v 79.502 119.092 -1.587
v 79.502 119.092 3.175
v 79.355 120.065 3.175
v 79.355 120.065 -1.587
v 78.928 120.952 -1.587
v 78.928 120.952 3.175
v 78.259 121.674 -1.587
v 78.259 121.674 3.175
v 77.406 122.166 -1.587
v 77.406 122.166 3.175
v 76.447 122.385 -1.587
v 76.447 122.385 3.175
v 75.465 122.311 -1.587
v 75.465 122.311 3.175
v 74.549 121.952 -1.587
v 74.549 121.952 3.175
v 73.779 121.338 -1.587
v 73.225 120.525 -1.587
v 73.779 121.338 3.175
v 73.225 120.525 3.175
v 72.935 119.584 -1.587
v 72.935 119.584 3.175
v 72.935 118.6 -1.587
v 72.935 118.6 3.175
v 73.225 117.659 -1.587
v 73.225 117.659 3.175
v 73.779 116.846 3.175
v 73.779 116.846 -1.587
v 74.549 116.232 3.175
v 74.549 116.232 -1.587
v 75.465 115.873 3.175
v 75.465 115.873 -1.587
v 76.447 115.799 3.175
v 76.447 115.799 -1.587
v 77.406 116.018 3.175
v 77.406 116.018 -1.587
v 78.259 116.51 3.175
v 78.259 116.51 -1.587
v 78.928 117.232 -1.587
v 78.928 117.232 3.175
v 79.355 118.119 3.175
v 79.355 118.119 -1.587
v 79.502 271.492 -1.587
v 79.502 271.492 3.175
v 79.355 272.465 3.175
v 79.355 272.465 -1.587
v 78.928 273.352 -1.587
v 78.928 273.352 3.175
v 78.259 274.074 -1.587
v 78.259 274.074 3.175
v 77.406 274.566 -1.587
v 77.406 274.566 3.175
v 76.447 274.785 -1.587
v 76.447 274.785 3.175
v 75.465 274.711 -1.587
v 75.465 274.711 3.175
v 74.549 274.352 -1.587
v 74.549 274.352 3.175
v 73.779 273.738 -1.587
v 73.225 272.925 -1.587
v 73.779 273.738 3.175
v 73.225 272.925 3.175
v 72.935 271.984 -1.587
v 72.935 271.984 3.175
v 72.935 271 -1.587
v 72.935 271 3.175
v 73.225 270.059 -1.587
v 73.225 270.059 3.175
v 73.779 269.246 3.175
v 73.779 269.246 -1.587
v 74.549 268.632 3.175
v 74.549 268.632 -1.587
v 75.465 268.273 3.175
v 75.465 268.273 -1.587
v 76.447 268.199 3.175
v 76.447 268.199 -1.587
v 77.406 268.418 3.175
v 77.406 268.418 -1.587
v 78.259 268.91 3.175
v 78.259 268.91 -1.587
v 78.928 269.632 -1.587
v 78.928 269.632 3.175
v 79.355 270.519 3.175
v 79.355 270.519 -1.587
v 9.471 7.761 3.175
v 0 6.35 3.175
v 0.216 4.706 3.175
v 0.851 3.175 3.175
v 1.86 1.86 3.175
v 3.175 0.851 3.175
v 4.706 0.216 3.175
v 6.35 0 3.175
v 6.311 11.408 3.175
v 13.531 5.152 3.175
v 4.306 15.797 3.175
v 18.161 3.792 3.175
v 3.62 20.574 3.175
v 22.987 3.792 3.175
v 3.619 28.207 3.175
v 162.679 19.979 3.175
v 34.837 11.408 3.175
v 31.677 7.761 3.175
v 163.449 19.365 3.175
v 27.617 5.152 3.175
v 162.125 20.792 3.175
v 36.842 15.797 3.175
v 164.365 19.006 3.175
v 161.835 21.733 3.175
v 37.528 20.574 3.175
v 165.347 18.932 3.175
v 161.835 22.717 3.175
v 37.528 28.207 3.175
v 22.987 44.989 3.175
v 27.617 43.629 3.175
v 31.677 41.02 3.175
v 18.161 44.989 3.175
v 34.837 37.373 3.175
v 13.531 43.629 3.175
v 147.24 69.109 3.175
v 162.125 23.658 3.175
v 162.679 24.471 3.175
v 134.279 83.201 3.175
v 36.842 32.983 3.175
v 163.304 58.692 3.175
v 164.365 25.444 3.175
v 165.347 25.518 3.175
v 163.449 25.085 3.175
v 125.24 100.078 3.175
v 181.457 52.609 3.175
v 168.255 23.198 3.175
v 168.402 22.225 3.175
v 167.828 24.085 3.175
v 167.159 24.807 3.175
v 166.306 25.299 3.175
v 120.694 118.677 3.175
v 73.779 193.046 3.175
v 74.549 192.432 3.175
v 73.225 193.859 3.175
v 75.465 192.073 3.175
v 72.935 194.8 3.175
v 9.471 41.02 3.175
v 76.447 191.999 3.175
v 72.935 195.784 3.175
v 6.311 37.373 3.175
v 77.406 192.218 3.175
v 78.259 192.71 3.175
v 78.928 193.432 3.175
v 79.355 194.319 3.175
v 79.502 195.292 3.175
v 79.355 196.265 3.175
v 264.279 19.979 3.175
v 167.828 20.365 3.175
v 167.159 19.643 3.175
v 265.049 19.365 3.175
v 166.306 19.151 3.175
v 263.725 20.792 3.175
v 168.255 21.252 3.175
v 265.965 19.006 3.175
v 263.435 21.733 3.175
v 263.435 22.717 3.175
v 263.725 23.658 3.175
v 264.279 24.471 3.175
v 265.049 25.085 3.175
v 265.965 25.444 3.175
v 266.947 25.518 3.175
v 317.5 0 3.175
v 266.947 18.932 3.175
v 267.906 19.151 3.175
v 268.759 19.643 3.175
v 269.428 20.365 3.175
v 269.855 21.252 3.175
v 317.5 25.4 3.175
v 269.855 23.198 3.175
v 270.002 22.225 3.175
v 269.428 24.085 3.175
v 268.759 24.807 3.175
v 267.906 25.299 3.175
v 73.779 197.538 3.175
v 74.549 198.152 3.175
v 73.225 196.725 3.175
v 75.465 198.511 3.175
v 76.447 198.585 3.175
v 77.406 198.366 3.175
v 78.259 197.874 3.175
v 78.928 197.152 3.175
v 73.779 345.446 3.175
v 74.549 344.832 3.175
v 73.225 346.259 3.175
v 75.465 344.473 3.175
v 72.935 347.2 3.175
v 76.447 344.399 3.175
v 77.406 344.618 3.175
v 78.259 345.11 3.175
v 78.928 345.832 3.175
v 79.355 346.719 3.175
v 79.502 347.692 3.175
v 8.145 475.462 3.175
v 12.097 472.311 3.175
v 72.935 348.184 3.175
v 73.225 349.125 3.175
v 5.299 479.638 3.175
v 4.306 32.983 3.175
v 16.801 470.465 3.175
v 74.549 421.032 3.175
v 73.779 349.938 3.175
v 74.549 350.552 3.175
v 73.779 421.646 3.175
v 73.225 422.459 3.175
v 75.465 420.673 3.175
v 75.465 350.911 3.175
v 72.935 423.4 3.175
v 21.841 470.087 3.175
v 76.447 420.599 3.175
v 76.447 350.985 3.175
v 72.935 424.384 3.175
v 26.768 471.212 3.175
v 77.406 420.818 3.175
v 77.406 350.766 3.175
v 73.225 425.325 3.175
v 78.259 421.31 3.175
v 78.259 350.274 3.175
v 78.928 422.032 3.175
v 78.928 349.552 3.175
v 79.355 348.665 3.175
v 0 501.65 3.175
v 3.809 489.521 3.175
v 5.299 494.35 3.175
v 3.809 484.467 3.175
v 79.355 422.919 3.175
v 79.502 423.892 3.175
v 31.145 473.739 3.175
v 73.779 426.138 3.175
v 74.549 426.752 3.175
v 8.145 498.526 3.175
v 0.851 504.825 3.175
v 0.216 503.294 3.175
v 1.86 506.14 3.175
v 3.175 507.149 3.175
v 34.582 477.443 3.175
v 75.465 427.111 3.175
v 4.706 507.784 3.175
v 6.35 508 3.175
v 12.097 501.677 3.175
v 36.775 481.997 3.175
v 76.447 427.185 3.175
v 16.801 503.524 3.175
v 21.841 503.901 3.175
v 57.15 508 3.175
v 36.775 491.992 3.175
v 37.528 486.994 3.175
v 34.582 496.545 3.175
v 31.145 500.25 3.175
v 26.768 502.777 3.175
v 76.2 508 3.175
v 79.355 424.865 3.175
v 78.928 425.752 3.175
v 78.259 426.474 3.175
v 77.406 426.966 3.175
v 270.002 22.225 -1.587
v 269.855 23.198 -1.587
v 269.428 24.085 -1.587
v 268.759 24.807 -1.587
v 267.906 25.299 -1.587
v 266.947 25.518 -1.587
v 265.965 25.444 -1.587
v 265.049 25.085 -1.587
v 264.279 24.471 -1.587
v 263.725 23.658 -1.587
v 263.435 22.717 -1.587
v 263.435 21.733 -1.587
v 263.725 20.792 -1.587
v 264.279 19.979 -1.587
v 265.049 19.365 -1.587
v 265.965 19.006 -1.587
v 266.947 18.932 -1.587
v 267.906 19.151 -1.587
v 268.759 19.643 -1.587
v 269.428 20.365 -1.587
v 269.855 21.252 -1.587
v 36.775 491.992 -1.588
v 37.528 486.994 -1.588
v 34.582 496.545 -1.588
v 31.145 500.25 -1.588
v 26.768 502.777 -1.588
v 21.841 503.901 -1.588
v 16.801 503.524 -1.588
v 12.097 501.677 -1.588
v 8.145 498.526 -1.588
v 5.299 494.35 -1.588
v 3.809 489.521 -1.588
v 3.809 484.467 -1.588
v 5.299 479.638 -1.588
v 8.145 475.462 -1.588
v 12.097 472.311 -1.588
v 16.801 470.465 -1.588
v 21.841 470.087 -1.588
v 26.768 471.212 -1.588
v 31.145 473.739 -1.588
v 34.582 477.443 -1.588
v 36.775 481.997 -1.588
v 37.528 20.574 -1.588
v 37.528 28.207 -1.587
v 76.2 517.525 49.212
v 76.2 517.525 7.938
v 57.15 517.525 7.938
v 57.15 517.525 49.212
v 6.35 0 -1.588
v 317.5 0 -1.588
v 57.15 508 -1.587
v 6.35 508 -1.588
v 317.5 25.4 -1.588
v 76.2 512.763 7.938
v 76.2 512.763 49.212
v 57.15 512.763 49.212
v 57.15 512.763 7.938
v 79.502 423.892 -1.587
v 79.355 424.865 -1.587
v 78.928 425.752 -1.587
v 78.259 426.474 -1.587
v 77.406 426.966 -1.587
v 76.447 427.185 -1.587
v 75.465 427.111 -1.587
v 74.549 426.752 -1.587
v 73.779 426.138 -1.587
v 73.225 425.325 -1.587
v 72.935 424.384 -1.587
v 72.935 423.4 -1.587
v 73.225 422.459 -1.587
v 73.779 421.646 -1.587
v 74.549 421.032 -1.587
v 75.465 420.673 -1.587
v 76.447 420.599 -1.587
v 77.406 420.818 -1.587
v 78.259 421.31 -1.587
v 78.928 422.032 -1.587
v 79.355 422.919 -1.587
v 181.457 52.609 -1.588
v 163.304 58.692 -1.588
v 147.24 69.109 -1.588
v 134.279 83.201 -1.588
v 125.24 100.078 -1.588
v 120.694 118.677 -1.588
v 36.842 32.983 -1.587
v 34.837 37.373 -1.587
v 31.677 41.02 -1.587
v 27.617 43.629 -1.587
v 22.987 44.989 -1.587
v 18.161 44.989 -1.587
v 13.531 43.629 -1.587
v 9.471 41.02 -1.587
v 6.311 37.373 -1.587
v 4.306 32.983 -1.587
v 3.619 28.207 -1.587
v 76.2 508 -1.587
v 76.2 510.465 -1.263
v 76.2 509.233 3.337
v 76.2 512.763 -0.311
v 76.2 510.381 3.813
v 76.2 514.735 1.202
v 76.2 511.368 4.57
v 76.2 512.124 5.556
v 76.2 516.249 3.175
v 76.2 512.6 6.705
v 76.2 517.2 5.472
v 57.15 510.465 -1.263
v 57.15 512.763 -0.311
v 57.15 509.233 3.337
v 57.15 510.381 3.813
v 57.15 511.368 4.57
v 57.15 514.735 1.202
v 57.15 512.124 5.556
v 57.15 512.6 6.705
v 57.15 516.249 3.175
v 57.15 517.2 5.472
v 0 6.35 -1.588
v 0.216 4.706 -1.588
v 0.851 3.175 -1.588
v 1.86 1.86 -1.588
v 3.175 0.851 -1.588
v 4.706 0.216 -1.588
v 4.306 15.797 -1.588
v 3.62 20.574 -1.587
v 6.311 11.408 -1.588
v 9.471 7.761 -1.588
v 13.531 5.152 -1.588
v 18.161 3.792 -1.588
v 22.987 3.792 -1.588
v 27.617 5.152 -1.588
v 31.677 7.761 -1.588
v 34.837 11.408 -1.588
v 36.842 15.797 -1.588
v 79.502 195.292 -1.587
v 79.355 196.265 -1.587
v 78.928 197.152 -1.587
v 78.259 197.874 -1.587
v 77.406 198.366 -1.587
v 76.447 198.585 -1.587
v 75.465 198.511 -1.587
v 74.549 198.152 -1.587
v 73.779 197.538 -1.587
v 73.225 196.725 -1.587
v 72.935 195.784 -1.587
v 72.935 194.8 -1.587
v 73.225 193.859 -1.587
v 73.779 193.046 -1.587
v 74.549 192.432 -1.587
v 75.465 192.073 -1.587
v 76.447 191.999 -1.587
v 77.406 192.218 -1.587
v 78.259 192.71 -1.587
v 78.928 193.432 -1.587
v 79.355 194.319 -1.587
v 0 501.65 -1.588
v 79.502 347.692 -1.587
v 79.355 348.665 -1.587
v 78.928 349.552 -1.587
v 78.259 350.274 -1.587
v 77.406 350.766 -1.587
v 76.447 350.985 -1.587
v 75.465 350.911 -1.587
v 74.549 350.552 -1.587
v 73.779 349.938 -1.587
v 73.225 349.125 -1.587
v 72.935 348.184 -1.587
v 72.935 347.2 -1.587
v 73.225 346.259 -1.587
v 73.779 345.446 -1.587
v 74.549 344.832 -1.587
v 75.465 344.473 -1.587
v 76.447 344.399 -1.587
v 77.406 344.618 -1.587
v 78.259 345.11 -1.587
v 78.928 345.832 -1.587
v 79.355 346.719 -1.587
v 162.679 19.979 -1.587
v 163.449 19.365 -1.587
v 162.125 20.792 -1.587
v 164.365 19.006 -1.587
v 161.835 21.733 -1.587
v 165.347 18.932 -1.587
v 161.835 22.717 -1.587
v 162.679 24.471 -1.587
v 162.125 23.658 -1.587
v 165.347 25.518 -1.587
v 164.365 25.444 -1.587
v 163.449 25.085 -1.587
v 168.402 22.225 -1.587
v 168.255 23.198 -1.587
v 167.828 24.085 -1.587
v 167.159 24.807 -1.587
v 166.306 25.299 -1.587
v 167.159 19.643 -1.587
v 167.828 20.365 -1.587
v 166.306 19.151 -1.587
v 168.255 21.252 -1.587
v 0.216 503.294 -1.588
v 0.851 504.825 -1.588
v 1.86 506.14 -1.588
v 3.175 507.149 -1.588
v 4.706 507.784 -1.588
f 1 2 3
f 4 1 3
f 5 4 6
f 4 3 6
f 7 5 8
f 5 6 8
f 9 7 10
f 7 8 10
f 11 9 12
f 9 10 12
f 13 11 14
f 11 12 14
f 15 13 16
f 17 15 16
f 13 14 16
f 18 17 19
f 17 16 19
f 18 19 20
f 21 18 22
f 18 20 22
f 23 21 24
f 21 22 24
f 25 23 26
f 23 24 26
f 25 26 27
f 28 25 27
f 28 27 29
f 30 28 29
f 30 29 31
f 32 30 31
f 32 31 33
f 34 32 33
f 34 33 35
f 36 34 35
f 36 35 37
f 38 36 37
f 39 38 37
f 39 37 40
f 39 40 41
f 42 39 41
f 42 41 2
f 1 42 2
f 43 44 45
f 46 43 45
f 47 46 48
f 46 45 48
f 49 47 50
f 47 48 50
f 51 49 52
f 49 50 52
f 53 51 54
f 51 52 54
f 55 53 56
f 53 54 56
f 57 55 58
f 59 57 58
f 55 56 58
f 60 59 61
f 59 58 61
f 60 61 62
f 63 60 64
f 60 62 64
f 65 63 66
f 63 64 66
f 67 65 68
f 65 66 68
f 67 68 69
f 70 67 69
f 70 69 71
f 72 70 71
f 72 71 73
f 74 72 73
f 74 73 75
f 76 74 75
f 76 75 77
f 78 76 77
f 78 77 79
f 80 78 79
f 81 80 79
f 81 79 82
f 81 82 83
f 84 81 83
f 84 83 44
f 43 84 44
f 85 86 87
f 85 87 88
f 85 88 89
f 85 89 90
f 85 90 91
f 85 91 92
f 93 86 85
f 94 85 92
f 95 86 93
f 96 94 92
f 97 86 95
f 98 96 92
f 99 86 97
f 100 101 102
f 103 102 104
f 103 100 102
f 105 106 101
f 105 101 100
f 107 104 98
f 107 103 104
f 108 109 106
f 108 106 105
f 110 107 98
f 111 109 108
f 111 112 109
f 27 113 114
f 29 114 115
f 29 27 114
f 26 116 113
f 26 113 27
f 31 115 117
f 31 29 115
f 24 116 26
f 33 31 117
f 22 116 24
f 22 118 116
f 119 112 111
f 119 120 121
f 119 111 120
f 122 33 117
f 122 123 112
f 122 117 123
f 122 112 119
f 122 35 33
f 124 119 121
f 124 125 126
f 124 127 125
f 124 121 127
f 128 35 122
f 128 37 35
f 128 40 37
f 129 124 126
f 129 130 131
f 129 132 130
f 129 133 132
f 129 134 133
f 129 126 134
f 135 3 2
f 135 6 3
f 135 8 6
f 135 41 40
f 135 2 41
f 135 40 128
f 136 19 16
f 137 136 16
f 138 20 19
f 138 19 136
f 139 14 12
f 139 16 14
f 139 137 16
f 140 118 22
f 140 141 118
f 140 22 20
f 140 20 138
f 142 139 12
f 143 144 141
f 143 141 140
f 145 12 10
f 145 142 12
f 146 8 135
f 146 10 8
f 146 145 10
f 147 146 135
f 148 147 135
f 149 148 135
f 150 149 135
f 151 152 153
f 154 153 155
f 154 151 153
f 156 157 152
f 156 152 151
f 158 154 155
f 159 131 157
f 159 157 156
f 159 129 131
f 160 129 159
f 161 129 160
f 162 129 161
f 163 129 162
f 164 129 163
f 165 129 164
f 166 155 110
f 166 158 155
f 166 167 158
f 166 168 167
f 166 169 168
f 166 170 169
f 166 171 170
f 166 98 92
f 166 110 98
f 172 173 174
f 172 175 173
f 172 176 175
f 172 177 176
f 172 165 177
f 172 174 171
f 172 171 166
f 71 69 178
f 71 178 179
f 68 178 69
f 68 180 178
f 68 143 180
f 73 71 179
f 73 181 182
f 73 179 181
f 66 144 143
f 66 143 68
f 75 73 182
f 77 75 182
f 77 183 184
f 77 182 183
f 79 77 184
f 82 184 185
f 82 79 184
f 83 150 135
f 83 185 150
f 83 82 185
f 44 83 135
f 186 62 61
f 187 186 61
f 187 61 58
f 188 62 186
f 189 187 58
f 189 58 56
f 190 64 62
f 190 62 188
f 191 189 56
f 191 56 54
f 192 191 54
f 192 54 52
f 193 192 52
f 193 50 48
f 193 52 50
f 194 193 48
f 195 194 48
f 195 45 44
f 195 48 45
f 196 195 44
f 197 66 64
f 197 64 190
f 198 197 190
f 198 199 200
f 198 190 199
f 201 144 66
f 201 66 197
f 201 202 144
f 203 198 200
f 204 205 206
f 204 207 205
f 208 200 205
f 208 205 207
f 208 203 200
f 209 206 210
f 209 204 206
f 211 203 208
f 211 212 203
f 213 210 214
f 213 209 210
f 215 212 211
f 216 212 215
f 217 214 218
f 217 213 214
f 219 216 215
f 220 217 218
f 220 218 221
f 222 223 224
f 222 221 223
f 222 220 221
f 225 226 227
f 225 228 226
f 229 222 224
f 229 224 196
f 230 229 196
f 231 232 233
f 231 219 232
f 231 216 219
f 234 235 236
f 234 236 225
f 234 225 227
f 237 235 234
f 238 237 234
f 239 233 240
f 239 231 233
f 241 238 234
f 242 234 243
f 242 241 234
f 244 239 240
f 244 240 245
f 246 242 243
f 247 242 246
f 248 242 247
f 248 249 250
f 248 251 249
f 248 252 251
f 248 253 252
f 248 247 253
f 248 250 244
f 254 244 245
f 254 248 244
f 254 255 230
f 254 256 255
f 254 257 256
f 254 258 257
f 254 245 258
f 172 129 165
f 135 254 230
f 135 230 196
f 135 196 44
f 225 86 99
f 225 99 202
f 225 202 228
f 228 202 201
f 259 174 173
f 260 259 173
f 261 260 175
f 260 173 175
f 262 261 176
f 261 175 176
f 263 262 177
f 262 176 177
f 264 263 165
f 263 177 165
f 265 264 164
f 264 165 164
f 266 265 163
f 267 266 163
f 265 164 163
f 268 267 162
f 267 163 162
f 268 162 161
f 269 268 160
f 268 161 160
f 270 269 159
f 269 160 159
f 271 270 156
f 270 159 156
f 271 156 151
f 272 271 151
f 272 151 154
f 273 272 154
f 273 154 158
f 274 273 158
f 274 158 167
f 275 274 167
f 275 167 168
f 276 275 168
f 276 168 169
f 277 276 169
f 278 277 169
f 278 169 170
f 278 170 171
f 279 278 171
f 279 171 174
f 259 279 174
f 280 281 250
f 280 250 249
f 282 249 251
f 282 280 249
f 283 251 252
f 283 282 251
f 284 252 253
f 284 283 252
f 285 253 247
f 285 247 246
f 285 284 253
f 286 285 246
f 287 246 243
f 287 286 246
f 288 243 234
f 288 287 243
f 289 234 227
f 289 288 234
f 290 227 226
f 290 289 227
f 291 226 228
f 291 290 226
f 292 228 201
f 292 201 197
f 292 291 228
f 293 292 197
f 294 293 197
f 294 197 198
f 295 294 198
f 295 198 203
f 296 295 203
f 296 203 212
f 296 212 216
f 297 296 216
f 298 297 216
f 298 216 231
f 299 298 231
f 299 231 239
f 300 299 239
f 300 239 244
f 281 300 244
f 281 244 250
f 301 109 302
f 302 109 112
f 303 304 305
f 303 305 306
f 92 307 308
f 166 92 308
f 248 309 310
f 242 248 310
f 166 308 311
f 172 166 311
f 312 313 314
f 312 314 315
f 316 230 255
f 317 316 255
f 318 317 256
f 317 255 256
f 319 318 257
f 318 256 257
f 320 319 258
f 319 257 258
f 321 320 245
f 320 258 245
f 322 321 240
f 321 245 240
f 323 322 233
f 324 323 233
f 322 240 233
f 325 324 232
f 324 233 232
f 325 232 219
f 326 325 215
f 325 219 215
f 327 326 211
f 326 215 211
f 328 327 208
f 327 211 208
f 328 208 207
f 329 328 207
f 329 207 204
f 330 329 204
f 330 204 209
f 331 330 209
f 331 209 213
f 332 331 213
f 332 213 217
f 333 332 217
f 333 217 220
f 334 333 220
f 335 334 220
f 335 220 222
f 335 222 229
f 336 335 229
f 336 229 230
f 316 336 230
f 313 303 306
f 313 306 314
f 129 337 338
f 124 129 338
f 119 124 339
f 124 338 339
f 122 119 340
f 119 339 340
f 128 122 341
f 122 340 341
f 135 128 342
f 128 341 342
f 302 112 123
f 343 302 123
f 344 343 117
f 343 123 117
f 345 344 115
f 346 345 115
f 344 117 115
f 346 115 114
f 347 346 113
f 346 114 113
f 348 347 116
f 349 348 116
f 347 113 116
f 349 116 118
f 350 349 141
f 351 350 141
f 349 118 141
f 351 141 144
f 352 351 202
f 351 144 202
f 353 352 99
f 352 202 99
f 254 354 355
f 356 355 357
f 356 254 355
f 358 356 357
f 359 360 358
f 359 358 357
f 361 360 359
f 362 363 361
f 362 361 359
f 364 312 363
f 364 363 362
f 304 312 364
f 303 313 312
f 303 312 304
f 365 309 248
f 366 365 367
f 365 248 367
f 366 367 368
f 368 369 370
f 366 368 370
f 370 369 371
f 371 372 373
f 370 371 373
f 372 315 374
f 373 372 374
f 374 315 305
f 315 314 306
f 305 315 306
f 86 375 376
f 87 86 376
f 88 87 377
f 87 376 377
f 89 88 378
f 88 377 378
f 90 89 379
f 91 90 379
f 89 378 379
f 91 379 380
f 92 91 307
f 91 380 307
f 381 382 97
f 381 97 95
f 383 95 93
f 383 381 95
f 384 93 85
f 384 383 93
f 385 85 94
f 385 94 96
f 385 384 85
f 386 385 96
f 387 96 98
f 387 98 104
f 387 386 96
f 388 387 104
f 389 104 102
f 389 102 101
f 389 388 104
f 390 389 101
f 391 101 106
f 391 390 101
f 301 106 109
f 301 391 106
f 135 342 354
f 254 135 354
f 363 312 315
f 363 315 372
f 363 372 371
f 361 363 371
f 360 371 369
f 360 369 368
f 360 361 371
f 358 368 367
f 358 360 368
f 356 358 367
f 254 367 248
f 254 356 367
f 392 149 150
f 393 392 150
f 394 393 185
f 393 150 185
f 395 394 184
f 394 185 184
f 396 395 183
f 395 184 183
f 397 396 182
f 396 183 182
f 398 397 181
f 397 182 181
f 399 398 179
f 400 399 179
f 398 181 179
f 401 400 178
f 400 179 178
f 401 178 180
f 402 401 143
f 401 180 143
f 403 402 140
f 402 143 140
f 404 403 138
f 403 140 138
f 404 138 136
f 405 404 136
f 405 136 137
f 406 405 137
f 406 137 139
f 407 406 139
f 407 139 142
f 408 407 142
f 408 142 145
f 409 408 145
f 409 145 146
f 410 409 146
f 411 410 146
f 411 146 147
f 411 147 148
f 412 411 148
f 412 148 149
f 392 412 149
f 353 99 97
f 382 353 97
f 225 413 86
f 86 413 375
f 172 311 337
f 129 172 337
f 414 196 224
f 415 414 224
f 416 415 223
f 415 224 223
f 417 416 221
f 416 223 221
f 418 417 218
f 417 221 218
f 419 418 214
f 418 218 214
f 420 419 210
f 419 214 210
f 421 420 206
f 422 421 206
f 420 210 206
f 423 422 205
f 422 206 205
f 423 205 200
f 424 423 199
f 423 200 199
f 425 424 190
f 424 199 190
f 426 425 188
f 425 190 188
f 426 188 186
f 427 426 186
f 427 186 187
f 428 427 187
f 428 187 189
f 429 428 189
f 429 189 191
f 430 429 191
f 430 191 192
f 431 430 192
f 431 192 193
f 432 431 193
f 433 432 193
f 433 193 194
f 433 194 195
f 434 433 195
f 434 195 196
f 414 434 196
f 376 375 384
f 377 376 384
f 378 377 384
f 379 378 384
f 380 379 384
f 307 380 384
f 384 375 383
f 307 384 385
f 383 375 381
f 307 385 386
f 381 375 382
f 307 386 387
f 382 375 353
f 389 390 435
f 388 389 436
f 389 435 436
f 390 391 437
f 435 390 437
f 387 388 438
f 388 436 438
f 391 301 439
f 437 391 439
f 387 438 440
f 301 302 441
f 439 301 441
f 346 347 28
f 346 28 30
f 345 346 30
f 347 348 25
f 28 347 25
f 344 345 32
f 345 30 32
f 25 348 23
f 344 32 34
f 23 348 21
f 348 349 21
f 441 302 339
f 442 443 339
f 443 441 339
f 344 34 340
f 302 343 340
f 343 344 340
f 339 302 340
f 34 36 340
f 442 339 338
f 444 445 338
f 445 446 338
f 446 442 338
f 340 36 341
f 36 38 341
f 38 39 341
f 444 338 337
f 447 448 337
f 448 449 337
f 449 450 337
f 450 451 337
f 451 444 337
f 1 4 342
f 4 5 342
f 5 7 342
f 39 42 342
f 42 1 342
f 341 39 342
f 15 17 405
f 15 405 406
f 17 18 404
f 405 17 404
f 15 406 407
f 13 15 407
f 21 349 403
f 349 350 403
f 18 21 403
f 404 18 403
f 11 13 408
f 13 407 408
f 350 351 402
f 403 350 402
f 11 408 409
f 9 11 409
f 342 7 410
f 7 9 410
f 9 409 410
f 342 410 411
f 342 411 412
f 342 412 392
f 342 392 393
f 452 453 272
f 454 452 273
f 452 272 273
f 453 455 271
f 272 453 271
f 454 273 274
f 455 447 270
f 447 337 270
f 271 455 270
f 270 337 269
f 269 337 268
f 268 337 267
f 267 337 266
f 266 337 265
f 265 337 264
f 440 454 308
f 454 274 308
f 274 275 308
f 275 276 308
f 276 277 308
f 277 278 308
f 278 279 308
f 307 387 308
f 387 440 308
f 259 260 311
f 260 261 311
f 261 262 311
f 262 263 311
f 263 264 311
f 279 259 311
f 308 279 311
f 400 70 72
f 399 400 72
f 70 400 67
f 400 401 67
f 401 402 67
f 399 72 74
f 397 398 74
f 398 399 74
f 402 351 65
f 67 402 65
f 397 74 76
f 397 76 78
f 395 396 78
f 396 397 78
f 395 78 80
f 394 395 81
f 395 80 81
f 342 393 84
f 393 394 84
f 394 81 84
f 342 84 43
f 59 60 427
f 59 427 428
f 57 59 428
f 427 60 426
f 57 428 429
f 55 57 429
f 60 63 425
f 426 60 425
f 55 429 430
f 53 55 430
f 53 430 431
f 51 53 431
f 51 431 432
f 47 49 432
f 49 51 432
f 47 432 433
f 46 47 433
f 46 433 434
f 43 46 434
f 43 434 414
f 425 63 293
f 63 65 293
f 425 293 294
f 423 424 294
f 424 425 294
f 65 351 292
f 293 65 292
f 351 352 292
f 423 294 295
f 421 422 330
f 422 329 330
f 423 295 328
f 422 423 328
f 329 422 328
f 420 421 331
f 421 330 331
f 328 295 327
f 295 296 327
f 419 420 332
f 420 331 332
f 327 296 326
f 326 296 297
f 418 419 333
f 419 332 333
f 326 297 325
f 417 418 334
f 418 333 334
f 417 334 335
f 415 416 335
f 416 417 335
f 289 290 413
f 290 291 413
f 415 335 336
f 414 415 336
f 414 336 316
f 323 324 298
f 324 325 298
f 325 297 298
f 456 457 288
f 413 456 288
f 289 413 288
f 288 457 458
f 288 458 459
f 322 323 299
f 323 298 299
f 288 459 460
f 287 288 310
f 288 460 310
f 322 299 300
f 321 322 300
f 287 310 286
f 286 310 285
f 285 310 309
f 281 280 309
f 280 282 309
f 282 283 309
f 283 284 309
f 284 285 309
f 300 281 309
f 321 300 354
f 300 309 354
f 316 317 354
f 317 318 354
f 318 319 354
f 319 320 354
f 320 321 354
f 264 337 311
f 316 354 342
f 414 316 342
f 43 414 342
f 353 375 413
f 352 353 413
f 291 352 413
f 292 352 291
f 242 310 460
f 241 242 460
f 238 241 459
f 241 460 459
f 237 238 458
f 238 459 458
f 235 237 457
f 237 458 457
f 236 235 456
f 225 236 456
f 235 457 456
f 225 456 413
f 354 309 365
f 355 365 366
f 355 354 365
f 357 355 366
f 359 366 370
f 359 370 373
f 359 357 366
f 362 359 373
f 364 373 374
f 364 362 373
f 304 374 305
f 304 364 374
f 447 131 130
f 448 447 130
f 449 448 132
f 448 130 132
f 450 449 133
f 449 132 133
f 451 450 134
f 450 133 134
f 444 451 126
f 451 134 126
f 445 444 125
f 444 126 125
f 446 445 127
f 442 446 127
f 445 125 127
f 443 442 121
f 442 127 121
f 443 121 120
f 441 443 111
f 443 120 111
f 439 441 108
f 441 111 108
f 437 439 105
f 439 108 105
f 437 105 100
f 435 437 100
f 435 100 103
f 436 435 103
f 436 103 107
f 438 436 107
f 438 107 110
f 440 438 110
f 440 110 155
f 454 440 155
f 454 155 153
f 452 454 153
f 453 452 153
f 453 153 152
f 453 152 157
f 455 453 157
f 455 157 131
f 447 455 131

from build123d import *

# Parameters (mm, degrees)
BOSS_EXTRUDE1_DEPTH      = 3.175
SKETCH2_R                = 16.9545
CUT_EXTRUDE1_DEPTH       = 600.06621556
CONVERT_SOLID1_START     = -1.5875
CONVERT_SOLID1_OUTLINE_R = 16.9545
CONVERT_SOLID1_DEPTH     = 1.5875
EDGE_FLANGE3_DEPTH       = 19.05
SKETCH17_R               = 3.302
CUT_EXTRUDE4_DEPTH       = 609.89886437
CUT_EXTRUDE5_DEPTH       = 609.89886437
SKETCH19_R               = 3.302
CUT_EXTRUDE6_DEPTH       = 610.147146247


# Read off the part's stored shape, not the designer's step: Convert-Solid1
# Sheet-metal steps are written as plain solids
with BuildPart() as part:
    # Sketch1 → Boss-Extrude1 (new body)
    with BuildSketch(Plane.XY):
        with BuildLine():
            Line((6.35, 0), (317.5, 0))
            Line((317.5, 0), (317.5, 25.4))
            Line((317.5, 25.4), (181.457249023, 52.608550195))
            ThreePointArc((181.457249023, 52.608550195), (140.315142877, 75.746018143), (120.694108864, 118.676547437))
            Line((120.694108864, 118.676547437), (76.2, 508))
            Line((76.2, 508), (6.35, 508))
            ThreePointArc((6.35, 508), (1.859871939, 506.140128061), (0, 501.65))
            Line((0, 501.65), (0, 6.35))
            ThreePointArc((0, 6.35), (1.859871939, 1.859871939), (6.35, 0))
        make_face()
    extrude(amount=BOSS_EXTRUDE1_DEPTH)

    # Sketch2 → Cut-Extrude1 (cut, through all)
    with BuildSketch(Plane.XY.offset(3.175)):
        with Locations((20.574, 486.9942)):
            Circle(SKETCH2_R)
        with Locations((20.574, 20.574)):
            Circle(SKETCH2_R)
    extrude(amount=-CUT_EXTRUDE1_DEPTH, mode=Mode.SUBTRACT)

    # Convert-Solid1 outline → Convert-Solid1 (add)
    with BuildSketch(Plane.XY.offset(CONVERT_SOLID1_START)):
        with BuildLine():
            Line((317.5, 25.4), (181.457249023, 52.608550195))
            ThreePointArc((181.457249023, 52.608550195), (140.315142877, 75.746018143), (120.694108864, 118.676547437))
            Line((120.694108864, 118.676547437), (76.2, 508))
            Line((76.2, 508), (6.35, 508))
            ThreePointArc((6.35, 508), (1.859871939, 506.140128061), (0, 501.65))
            Line((0, 501.65), (0, 6.35))
            ThreePointArc((0, 6.35), (1.859871939, 1.859871939), (6.35, 0))
            Line((6.35, 0), (317.5, 0))
            Line((317.5, 0), (317.5, 25.4))
        make_face()
        with Locations((20.574, 20.574)):
            Circle(CONVERT_SOLID1_OUTLINE_R, mode=Mode.SUBTRACT)
        with Locations((20.574, 486.9942)):
            Circle(CONVERT_SOLID1_OUTLINE_R, mode=Mode.SUBTRACT)
    extrude(amount=CONVERT_SOLID1_DEPTH)

    # Edge-Flange3 section (across the edge) → Edge-Flange3 (add)
    with BuildSketch(Plane(origin=(76.2, 512.7625, 3.175), x_dir=(0, -1, 0), z_dir=(-1, 0, 0))):
        with BuildLine():
            Line((-4.7625, 4.7625), (-4.7625, 46.0375))
            Line((-4.7625, 46.0375), (0, 46.0375))
            Line((0, 46.0375), (0, 4.7625))
            ThreePointArc((0, 4.7625), (1.394903955, 1.394903955), (4.7625, 0))
            Line((4.7625, 0), (4.7625, -4.7625))
            ThreePointArc((4.7625, -4.7625), (-1.972692091, -1.972692091), (-4.7625, 4.7625))
        make_face()
    extrude(amount=EDGE_FLANGE3_DEPTH)

    # Sketch17 → Cut-Extrude4 (cut, through all)
    with BuildSketch(Plane.XY.offset(3.175)):
        with Locations((76.2, 423.892006342)):
            Circle(SKETCH17_R)
        with Locations((76.2, 347.692006342)):
            Circle(SKETCH17_R)
        with Locations((76.2, 271.492006342)):
            Circle(SKETCH17_R)
        with Locations((76.2, 195.292006342)):
            Circle(SKETCH17_R)
        with Locations((76.2, 119.092006342)):
            Circle(SKETCH17_R)
        with Locations((266.7, 22.225)):
            Circle(SKETCH17_R)
        with Locations((165.1, 22.225)):
            Circle(SKETCH17_R)
    extrude(amount=-CUT_EXTRUDE4_DEPTH, mode=Mode.SUBTRACT)

    # Sketch18 → Cut-Extrude5 (cut, through all)
    with BuildSketch(Plane.XY.offset(3.175)):
        with BuildLine():
            Line((3.6195, 28.2067), (3.6195, 20.574))
            ThreePointArc((3.6195, 20.574), (20.574, 3.6195), (37.5285, 20.574))
            Line((37.5285, 20.574), (37.5285, 28.2067))
            ThreePointArc((37.5285, 28.2067), (20.574, 45.1612), (3.6195, 28.2067))
        make_face()
    extrude(amount=-CUT_EXTRUDE5_DEPTH, mode=Mode.SUBTRACT)

    # Sketch19 → Cut-Extrude6 (cut, through all)
    with BuildSketch(Plane(origin=(0, 517.525, 0), x_dir=(0, 0, -1), z_dir=(0, 1, 0))):
        with Locations((-28.575, -82.55)):
            Circle(SKETCH19_R)
        with Locations((-28.575, -50.8)):
            Circle(SKETCH19_R)
    extrude(amount=-CUT_EXTRUDE6_DEPTH, mode=Mode.SUBTRACT)


solid = part.part
